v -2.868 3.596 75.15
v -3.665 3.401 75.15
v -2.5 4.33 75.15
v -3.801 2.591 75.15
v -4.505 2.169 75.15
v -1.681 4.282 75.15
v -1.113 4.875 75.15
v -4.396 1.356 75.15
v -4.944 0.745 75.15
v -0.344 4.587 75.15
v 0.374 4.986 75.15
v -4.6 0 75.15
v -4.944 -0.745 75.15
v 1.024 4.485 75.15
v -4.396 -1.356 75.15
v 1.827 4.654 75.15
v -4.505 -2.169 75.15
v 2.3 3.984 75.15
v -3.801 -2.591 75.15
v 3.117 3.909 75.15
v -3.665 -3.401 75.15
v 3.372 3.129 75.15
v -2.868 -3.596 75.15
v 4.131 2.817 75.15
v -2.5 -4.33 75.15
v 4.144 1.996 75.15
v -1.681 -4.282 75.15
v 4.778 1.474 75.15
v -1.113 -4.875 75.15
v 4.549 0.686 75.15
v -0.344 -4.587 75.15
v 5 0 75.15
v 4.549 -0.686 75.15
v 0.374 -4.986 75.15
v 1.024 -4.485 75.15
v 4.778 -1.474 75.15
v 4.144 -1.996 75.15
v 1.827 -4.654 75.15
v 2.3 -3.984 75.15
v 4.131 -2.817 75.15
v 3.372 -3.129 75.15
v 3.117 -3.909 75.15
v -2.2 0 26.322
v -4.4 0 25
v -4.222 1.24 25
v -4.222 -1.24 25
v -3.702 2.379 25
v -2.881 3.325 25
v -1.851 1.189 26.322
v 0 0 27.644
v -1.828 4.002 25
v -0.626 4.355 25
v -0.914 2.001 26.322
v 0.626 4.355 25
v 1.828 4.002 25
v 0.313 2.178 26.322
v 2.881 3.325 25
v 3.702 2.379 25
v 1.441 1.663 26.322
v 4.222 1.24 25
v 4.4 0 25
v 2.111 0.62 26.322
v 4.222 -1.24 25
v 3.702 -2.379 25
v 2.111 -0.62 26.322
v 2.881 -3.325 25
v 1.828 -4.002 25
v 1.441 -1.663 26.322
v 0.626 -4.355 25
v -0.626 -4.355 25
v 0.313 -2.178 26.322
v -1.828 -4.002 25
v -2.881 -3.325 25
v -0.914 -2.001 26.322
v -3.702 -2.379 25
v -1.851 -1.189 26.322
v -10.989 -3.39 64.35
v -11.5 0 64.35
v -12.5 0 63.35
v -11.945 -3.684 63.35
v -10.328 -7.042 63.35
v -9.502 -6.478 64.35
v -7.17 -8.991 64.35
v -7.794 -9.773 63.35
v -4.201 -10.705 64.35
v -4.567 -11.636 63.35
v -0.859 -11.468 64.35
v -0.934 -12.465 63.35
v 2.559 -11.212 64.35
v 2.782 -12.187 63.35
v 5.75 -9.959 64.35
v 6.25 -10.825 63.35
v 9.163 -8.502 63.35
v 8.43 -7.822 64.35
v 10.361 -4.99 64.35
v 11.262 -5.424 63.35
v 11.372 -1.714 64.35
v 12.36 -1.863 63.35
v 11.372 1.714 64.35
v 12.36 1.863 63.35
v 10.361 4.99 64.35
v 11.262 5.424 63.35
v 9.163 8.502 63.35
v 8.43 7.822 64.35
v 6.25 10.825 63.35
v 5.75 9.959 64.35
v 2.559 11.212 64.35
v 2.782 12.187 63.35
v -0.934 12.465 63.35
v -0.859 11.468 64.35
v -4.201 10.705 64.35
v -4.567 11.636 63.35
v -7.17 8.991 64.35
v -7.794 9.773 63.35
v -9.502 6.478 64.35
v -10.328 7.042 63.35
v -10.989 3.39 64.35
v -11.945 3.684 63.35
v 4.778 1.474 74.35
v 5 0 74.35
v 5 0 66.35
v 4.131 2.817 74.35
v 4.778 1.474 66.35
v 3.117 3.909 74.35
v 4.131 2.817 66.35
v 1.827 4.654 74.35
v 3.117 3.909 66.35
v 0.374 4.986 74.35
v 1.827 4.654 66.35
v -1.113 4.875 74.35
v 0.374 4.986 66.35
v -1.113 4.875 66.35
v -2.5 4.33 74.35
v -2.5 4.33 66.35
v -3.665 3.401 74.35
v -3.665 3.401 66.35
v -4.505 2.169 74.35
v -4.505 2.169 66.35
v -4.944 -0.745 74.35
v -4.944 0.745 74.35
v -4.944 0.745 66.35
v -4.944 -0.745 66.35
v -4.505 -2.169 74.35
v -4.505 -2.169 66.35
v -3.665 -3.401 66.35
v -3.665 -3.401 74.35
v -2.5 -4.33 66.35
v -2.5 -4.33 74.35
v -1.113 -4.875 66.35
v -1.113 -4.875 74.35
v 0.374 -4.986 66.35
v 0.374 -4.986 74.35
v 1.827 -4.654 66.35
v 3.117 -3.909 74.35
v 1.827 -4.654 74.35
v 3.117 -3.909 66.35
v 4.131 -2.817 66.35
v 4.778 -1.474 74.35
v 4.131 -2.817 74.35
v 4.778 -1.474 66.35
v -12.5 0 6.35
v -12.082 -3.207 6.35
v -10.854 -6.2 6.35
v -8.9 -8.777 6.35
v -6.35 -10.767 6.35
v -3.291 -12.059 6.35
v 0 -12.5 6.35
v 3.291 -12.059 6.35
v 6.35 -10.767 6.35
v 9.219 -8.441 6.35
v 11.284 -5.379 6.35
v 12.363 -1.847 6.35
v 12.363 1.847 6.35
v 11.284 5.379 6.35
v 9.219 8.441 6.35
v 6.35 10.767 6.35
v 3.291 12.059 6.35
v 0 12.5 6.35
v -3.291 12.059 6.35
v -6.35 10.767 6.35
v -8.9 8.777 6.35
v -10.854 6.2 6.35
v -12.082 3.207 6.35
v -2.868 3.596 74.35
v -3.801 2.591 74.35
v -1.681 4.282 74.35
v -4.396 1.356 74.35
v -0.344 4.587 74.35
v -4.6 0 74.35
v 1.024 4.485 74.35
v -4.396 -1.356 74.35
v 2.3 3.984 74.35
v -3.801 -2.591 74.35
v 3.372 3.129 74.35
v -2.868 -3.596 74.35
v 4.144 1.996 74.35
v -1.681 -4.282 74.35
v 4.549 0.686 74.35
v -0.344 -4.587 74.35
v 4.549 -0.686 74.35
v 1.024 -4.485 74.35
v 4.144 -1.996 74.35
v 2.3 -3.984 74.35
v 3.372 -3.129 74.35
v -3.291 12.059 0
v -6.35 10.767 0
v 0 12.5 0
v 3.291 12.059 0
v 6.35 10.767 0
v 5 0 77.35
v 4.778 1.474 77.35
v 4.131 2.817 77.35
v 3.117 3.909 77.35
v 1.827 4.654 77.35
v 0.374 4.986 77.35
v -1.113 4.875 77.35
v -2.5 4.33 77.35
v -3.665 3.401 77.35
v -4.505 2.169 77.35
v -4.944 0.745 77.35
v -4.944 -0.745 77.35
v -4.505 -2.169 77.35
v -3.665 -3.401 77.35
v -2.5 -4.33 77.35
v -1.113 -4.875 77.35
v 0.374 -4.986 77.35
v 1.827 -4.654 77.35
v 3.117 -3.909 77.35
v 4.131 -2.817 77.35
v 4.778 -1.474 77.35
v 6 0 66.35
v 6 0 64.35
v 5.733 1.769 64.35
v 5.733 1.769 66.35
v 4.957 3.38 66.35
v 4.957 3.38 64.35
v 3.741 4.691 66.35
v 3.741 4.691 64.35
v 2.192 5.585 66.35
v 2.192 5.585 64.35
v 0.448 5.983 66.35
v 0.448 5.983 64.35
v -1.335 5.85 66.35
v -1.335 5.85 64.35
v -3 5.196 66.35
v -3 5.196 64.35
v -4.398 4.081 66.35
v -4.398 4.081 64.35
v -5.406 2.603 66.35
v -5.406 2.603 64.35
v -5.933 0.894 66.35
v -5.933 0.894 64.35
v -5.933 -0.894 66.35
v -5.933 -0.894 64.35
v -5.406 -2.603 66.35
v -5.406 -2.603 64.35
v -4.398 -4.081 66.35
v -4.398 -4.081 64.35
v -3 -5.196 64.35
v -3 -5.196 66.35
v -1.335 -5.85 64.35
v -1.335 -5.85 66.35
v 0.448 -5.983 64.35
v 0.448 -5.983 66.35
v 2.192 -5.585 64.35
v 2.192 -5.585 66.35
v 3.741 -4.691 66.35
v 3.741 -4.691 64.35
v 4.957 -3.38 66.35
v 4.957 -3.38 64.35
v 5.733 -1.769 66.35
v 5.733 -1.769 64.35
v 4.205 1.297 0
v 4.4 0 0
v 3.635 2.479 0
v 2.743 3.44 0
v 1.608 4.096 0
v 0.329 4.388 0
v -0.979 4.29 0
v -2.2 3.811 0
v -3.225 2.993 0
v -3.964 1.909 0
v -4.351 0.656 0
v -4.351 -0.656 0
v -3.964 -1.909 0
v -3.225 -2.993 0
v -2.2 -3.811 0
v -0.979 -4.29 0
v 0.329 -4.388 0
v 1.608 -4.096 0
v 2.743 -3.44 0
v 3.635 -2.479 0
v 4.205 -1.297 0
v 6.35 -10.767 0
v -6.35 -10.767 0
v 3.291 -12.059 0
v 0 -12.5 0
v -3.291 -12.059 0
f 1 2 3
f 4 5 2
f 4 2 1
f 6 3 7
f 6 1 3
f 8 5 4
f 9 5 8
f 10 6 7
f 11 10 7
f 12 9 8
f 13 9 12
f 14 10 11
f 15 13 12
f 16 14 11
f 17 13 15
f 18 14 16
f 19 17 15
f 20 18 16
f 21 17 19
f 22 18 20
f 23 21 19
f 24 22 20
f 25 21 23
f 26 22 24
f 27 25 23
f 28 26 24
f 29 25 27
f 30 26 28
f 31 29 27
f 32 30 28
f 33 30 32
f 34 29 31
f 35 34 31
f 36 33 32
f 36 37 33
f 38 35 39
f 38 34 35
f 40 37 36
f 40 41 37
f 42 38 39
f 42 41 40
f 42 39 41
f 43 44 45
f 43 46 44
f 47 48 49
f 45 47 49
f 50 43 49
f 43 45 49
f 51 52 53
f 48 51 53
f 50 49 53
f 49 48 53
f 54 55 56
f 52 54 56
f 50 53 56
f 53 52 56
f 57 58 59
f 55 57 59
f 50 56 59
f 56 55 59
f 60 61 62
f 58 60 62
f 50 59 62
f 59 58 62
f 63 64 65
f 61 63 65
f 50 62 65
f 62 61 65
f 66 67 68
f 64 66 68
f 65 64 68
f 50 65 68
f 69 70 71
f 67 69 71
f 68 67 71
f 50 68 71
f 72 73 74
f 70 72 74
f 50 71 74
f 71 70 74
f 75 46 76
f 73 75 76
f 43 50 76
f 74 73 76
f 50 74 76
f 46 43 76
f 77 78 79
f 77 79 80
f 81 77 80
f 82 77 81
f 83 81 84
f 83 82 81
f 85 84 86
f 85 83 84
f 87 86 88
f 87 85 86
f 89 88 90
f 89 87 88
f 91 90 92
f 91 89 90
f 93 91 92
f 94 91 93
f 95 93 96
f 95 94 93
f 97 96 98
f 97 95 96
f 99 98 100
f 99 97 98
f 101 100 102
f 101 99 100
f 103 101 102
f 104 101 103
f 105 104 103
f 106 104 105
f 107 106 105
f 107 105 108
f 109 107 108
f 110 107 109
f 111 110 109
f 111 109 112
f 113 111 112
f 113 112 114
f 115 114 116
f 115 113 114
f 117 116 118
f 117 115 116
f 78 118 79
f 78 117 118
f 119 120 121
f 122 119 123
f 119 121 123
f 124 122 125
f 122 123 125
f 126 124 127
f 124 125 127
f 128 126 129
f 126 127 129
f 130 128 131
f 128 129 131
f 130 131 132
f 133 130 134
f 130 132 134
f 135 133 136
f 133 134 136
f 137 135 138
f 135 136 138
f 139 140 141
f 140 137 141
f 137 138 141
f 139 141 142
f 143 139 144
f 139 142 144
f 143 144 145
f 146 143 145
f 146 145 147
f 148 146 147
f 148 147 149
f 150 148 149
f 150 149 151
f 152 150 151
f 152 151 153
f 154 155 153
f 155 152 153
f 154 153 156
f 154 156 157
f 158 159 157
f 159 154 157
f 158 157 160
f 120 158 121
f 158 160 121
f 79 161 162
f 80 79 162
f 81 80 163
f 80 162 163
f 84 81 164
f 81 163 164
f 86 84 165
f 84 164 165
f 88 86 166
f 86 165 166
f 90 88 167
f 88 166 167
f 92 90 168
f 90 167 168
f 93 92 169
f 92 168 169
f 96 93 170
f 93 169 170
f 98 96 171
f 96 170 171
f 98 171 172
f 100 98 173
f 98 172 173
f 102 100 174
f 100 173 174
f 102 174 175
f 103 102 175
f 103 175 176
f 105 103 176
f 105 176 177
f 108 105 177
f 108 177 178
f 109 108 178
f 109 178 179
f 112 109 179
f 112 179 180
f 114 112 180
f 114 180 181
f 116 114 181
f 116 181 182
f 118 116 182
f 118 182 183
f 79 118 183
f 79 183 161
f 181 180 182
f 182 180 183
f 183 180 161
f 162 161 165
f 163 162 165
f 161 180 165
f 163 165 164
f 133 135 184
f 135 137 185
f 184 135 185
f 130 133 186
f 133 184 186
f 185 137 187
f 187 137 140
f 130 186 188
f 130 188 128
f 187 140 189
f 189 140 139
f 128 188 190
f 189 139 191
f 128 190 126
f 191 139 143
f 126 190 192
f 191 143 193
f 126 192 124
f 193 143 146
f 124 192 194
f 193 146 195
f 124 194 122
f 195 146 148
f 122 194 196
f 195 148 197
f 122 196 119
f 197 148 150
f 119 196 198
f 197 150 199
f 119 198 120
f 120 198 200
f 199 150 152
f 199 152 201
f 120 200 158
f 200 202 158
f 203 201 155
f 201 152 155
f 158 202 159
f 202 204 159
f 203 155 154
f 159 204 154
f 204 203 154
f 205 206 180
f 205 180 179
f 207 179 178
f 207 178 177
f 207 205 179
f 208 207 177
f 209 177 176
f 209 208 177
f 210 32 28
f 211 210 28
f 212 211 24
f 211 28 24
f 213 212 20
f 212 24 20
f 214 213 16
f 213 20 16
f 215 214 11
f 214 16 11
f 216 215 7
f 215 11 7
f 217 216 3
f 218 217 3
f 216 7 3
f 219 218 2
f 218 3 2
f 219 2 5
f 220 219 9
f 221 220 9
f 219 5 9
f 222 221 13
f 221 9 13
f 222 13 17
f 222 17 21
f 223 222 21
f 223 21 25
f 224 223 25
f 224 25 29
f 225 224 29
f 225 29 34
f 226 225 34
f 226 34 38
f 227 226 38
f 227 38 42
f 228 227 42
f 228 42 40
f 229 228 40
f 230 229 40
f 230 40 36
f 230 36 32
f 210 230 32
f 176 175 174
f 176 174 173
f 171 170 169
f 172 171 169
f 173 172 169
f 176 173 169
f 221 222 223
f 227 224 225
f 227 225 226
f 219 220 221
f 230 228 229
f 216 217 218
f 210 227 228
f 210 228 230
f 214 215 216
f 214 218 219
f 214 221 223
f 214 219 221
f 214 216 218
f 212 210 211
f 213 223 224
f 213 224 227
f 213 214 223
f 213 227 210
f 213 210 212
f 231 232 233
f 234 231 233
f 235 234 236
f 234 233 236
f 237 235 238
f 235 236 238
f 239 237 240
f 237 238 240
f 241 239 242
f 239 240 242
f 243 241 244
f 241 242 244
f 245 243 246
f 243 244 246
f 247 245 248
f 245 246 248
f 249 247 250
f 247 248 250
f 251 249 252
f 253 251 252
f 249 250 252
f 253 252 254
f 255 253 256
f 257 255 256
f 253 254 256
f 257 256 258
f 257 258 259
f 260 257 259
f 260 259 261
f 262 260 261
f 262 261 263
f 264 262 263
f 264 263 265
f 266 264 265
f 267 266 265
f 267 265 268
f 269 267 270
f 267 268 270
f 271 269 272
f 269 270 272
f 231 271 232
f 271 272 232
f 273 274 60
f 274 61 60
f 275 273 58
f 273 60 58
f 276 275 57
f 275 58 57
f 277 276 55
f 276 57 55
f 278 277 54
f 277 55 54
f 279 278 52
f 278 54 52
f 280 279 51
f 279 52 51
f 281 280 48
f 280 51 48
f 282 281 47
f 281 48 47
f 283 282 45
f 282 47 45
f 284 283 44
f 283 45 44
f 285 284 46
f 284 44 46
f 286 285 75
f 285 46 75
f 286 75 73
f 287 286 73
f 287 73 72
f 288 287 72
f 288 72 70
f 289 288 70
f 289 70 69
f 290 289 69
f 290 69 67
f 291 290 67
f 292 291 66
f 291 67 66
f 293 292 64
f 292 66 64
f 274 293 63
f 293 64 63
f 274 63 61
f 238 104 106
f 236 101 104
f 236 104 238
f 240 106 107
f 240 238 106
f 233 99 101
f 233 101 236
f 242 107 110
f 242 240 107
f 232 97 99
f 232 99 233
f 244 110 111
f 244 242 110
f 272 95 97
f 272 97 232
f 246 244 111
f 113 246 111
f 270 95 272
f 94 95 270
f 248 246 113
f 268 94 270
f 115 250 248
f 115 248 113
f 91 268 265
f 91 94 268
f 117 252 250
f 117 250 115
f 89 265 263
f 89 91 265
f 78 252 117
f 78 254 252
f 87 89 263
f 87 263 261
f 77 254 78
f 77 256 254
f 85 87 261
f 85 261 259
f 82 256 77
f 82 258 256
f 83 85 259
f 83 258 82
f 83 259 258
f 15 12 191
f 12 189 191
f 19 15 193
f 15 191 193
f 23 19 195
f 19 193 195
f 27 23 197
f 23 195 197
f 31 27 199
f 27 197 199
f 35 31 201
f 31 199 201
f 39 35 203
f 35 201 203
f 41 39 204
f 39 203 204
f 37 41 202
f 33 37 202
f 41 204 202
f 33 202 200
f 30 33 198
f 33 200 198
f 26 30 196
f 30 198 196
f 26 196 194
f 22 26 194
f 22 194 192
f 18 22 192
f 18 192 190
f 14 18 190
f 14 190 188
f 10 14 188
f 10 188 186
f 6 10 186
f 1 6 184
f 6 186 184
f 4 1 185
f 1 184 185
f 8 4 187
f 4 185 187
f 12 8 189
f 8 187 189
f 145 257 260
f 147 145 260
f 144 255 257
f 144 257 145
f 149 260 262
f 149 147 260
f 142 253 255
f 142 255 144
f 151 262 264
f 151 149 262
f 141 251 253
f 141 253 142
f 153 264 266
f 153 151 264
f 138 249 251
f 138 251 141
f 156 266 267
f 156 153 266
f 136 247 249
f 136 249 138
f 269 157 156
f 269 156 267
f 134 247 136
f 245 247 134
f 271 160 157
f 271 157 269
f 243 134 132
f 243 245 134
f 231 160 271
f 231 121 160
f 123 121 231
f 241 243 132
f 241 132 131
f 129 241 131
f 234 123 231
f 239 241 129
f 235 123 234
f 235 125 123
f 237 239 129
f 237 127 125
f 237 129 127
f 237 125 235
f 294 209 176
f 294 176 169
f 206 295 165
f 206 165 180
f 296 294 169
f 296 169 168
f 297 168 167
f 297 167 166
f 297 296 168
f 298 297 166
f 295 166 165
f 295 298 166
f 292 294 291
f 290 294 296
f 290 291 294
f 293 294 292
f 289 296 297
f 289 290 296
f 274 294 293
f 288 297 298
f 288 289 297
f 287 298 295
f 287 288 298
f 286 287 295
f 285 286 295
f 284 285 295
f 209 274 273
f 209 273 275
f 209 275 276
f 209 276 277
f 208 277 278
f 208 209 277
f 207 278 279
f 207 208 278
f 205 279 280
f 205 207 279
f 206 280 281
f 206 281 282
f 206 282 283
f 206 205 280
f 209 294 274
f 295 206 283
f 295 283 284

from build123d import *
from build123d.topology import SkipClean

# Parameters (mm, degrees)
CROQUIS1_R                      = 6.35
SALIENTE_EXTRUIR1_DEPTH         = 6.35
CROQUIS2_R                      = 12.5
SALIENTE_EXTRUIR2_DEPTH         = 58
CROQUIS3_R                      = 6
SALIENTE_EXTRUIR3_DEPTH         = 2
CROQUIS4_R                      = 5
SALIENTE_EXTRUIR4_DEPTH         = 11
SALIENTE_EXTRUIR5_START         = 6.35
SALIENTE_EXTRUIR5_DEPTH         = 6.35
CROQUIS7_W                      = 0.8
CROQUIS7_H                      = 0.8
CHAFL_N1_SIZE                   = 1
TALADRO_ROSCADO_M10X1_251_D     = 8.8
TALADRO_ROSCADO_M10X1_251_DEPTH = 25
TALADRO_ROSCADO_M10X1_251_TIP   = 2.643786724


with BuildPart() as part:
    # Croquis1 → Saliente-Extruir1 (new body)
    with BuildSketch(Plane.XY):
        Circle(CROQUIS1_R)
    extrude(amount=SALIENTE_EXTRUIR1_DEPTH)

    # Croquis2 → Saliente-Extruir2 (add)
    with BuildSketch(Plane.XY.offset(6.35)):
        with Locations(Location((0, 0, 0), (0, 0, 180))):
            Circle(CROQUIS2_R)
    extrude(amount=SALIENTE_EXTRUIR2_DEPTH)

    # Croquis3 → Saliente-Extruir3 (add)
    with BuildSketch(Plane.XY.offset(64.35)):
        Circle(CROQUIS3_R)
    extrude(amount=SALIENTE_EXTRUIR3_DEPTH)

    # Croquis4 → Saliente-Extruir4 (add)
    with BuildSketch(Plane.XY.offset(66.35)):
        Circle(CROQUIS4_R)
    extrude(amount=SALIENTE_EXTRUIR4_DEPTH)

    # Croquis6 → Saliente-Extruir5 (add)
    with SkipClean():  # the faces are left unmerged after this step: merging them gives an invalid solid
        with BuildSketch(Plane(origin=(0, 0, 6.35), x_dir=(-1, 0, 0), z_dir=(0, 0, -1)).offset(SALIENTE_EXTRUIR5_START)):
            with BuildLine():
                Line((-6.35, 10.76696336), (-6.35, -10.76696336))
                ThreePointArc((-6.35, -10.76696336), (0, -12.5), (6.35, -10.76696336))
                Line((6.35, -10.76696336), (6.35, 10.76696336))
                ThreePointArc((6.35, 10.76696336), (0, 12.5), (-6.35, 10.76696336))
            make_face()
        extrude(amount=-SALIENTE_EXTRUIR5_DEPTH)

    # Croquis7 → Cortar-Revolución1 (revolve, cut)
    with SkipClean():  # the faces are left unmerged after this step: merging them gives an invalid solid
        with BuildSketch(Plane(origin=(0, 0, 0), x_dir=(0, 0, -1), z_dir=(1, 0, 0)), mode=Mode.PRIVATE) as cortar_revoluci_n1_sk:
            with Locations((-74.75, 5)):
                Rectangle(CROQUIS7_W, CROQUIS7_H)
        revolve(cortar_revoluci_n1_sk.sketch.rotate(Axis((0, 0, 66.35), (0, 0, 1)), 90), axis=Axis((0, 0, 66.35), (0, 0, 1)), mode=Mode.SUBTRACT)

    # Chaflán1
    chafl_n1_edges = [part.edges().sort_by_distance(p)[0] for p in [
        (12.5, 0, 64.35),
    ]]
    chamfer(chafl_n1_edges, length=CHAFL_N1_SIZE)

    # Taladro roscado M10x1.251
    with Locations(Plane(origin=(0, 0, 0), x_dir=(-1, 0, 0), z_dir=(0, 0, -1))):
        with Locations((0, 0)):
            Hole(TALADRO_ROSCADO_M10X1_251_D / 2, depth=TALADRO_ROSCADO_M10X1_251_DEPTH)
            with Locations((0, 0, -(TALADRO_ROSCADO_M10X1_251_DEPTH + TALADRO_ROSCADO_M10X1_251_TIP / 2))):  # 118° drill point
                Cone(0, TALADRO_ROSCADO_M10X1_251_D / 2, TALADRO_ROSCADO_M10X1_251_TIP, mode=Mode.SUBTRACT)


solid = part.part
